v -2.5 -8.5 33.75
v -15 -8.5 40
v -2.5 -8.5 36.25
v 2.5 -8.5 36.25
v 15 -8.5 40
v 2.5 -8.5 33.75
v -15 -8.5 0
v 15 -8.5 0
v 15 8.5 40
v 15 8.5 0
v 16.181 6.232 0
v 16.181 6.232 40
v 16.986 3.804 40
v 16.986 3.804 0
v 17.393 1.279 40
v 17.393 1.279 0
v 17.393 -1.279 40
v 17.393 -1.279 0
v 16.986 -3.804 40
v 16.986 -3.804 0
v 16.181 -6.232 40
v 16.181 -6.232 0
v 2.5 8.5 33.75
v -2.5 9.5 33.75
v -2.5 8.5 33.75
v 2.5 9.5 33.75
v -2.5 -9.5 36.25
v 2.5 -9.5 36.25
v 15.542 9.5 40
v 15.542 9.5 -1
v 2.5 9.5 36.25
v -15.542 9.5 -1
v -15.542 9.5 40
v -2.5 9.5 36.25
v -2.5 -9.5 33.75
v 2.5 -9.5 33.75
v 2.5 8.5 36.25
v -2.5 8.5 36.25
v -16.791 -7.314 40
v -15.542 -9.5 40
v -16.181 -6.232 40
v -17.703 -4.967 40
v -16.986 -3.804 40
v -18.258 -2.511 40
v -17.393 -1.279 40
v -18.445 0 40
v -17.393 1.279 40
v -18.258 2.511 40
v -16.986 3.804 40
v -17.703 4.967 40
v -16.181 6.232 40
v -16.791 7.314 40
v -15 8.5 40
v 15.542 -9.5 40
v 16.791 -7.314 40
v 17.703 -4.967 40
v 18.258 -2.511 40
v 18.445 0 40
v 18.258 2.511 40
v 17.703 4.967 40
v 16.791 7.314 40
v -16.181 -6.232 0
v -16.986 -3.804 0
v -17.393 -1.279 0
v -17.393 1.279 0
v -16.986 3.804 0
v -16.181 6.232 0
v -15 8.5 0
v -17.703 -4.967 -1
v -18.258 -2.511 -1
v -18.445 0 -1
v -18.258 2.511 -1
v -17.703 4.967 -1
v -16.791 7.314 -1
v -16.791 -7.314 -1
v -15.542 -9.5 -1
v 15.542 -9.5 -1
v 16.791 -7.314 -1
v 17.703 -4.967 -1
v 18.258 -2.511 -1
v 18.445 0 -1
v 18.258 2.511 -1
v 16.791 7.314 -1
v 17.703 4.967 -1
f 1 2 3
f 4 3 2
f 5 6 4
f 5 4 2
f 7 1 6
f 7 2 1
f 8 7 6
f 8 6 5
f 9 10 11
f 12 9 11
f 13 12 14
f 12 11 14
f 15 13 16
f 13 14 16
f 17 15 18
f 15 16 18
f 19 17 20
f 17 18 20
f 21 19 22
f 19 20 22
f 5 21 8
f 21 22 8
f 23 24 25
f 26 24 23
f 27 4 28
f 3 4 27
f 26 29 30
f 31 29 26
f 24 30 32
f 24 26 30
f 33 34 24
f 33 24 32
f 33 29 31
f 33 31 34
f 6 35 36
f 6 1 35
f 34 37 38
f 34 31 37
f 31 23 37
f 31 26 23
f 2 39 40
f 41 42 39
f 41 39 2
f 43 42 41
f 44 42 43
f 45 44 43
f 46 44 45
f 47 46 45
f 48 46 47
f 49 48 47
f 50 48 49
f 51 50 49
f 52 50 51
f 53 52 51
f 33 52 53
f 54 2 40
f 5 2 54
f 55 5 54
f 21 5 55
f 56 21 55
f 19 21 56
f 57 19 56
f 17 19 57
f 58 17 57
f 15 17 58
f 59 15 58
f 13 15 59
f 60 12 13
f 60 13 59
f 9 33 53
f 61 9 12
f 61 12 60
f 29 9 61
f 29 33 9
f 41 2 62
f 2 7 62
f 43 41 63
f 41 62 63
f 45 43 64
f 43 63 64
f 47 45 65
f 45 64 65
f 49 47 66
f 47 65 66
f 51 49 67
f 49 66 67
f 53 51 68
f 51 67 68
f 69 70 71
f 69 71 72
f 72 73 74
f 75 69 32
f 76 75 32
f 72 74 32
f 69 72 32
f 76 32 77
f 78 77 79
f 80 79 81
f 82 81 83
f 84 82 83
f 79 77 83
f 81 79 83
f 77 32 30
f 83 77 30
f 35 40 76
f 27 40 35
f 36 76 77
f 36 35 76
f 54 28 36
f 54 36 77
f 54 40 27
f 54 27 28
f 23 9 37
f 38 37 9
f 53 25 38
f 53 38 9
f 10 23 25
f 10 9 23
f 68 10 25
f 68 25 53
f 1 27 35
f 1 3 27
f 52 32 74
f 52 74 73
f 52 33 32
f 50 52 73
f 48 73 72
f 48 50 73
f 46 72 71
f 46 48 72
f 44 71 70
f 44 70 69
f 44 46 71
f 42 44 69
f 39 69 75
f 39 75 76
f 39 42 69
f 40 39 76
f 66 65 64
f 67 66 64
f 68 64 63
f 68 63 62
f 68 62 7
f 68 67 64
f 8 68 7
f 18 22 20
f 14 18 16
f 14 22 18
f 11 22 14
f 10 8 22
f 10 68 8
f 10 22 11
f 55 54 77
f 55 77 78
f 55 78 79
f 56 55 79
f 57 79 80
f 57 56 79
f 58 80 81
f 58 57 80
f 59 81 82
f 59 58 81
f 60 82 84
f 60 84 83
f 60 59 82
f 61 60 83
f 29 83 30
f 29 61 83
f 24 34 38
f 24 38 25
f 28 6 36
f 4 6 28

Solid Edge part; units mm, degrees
sketch "Sketch1" plane through (0, 0, 0) normal (0, 0, 1) x (1, 0, 0)
  arc A0 (-15.5424, 9.5) -> (-15.5424, -9.5) centre (-1.4446, 0) ccw
  line L0 (-15.5424, -9.5) -> (15.5424, -9.5)
  arc A1 (15.5424, -9.5) -> (15.5424, 9.5) centre (1.4446, 0) ccw
  line L1 (15.5424, 9.5) -> (-15.5424, 9.5)
extrude "Protrusion1" add sketch "Sketch1" against normal blind 1
sketch "Sketch2" plane through (0, 0, 0) normal (0, 0, 1) x (1, 0, 0)
  arc A0 (-15.5424, 9.5) -> (-15.5424, -9.5) centre (-1.4446, 0) ccw
  line L0 (-15.5424, -9.5) -> (15.5424, -9.5)
  arc A1 (15.5424, -9.5) -> (15.5424, 9.5) centre (1.4446, 0) ccw
  line L1 (15.5424, 9.5) -> (-15.5424, 9.5)
  line L2 (-15, -8.5) -> (15, -8.5)
  arc A2 (15, 8.5) -> (15, -8.5) centre (1.4446, 0) cw
  line L3 (15, 8.5) -> (-15, 8.5)
  arc A3 (-15, 8.5) -> (-15, -8.5) centre (-1.4446, 0) ccw
  dimension "D1" = 1
extrude "ProtrusioneEstrusa_2" add sketch "Sketch2" along normal blind 40
sketch "Sketch3" plane through (0, -9.5, 19.5) normal (0, -1, 0) x (1, 0, 0)
  line L0 (2.5, 14.25) -> (2.5, 16.75)
  line L1 (2.5, 16.75) -> (-2.5, 16.75)
  line L2 (-2.5, 16.75) -> (-2.5, 14.25)
  line L3 (-2.5, 14.25) -> (2.5, 14.25)
extrude "ScavoEstrusione_1" cut sketch "Sketch3" along normal mid plane 58.0417
